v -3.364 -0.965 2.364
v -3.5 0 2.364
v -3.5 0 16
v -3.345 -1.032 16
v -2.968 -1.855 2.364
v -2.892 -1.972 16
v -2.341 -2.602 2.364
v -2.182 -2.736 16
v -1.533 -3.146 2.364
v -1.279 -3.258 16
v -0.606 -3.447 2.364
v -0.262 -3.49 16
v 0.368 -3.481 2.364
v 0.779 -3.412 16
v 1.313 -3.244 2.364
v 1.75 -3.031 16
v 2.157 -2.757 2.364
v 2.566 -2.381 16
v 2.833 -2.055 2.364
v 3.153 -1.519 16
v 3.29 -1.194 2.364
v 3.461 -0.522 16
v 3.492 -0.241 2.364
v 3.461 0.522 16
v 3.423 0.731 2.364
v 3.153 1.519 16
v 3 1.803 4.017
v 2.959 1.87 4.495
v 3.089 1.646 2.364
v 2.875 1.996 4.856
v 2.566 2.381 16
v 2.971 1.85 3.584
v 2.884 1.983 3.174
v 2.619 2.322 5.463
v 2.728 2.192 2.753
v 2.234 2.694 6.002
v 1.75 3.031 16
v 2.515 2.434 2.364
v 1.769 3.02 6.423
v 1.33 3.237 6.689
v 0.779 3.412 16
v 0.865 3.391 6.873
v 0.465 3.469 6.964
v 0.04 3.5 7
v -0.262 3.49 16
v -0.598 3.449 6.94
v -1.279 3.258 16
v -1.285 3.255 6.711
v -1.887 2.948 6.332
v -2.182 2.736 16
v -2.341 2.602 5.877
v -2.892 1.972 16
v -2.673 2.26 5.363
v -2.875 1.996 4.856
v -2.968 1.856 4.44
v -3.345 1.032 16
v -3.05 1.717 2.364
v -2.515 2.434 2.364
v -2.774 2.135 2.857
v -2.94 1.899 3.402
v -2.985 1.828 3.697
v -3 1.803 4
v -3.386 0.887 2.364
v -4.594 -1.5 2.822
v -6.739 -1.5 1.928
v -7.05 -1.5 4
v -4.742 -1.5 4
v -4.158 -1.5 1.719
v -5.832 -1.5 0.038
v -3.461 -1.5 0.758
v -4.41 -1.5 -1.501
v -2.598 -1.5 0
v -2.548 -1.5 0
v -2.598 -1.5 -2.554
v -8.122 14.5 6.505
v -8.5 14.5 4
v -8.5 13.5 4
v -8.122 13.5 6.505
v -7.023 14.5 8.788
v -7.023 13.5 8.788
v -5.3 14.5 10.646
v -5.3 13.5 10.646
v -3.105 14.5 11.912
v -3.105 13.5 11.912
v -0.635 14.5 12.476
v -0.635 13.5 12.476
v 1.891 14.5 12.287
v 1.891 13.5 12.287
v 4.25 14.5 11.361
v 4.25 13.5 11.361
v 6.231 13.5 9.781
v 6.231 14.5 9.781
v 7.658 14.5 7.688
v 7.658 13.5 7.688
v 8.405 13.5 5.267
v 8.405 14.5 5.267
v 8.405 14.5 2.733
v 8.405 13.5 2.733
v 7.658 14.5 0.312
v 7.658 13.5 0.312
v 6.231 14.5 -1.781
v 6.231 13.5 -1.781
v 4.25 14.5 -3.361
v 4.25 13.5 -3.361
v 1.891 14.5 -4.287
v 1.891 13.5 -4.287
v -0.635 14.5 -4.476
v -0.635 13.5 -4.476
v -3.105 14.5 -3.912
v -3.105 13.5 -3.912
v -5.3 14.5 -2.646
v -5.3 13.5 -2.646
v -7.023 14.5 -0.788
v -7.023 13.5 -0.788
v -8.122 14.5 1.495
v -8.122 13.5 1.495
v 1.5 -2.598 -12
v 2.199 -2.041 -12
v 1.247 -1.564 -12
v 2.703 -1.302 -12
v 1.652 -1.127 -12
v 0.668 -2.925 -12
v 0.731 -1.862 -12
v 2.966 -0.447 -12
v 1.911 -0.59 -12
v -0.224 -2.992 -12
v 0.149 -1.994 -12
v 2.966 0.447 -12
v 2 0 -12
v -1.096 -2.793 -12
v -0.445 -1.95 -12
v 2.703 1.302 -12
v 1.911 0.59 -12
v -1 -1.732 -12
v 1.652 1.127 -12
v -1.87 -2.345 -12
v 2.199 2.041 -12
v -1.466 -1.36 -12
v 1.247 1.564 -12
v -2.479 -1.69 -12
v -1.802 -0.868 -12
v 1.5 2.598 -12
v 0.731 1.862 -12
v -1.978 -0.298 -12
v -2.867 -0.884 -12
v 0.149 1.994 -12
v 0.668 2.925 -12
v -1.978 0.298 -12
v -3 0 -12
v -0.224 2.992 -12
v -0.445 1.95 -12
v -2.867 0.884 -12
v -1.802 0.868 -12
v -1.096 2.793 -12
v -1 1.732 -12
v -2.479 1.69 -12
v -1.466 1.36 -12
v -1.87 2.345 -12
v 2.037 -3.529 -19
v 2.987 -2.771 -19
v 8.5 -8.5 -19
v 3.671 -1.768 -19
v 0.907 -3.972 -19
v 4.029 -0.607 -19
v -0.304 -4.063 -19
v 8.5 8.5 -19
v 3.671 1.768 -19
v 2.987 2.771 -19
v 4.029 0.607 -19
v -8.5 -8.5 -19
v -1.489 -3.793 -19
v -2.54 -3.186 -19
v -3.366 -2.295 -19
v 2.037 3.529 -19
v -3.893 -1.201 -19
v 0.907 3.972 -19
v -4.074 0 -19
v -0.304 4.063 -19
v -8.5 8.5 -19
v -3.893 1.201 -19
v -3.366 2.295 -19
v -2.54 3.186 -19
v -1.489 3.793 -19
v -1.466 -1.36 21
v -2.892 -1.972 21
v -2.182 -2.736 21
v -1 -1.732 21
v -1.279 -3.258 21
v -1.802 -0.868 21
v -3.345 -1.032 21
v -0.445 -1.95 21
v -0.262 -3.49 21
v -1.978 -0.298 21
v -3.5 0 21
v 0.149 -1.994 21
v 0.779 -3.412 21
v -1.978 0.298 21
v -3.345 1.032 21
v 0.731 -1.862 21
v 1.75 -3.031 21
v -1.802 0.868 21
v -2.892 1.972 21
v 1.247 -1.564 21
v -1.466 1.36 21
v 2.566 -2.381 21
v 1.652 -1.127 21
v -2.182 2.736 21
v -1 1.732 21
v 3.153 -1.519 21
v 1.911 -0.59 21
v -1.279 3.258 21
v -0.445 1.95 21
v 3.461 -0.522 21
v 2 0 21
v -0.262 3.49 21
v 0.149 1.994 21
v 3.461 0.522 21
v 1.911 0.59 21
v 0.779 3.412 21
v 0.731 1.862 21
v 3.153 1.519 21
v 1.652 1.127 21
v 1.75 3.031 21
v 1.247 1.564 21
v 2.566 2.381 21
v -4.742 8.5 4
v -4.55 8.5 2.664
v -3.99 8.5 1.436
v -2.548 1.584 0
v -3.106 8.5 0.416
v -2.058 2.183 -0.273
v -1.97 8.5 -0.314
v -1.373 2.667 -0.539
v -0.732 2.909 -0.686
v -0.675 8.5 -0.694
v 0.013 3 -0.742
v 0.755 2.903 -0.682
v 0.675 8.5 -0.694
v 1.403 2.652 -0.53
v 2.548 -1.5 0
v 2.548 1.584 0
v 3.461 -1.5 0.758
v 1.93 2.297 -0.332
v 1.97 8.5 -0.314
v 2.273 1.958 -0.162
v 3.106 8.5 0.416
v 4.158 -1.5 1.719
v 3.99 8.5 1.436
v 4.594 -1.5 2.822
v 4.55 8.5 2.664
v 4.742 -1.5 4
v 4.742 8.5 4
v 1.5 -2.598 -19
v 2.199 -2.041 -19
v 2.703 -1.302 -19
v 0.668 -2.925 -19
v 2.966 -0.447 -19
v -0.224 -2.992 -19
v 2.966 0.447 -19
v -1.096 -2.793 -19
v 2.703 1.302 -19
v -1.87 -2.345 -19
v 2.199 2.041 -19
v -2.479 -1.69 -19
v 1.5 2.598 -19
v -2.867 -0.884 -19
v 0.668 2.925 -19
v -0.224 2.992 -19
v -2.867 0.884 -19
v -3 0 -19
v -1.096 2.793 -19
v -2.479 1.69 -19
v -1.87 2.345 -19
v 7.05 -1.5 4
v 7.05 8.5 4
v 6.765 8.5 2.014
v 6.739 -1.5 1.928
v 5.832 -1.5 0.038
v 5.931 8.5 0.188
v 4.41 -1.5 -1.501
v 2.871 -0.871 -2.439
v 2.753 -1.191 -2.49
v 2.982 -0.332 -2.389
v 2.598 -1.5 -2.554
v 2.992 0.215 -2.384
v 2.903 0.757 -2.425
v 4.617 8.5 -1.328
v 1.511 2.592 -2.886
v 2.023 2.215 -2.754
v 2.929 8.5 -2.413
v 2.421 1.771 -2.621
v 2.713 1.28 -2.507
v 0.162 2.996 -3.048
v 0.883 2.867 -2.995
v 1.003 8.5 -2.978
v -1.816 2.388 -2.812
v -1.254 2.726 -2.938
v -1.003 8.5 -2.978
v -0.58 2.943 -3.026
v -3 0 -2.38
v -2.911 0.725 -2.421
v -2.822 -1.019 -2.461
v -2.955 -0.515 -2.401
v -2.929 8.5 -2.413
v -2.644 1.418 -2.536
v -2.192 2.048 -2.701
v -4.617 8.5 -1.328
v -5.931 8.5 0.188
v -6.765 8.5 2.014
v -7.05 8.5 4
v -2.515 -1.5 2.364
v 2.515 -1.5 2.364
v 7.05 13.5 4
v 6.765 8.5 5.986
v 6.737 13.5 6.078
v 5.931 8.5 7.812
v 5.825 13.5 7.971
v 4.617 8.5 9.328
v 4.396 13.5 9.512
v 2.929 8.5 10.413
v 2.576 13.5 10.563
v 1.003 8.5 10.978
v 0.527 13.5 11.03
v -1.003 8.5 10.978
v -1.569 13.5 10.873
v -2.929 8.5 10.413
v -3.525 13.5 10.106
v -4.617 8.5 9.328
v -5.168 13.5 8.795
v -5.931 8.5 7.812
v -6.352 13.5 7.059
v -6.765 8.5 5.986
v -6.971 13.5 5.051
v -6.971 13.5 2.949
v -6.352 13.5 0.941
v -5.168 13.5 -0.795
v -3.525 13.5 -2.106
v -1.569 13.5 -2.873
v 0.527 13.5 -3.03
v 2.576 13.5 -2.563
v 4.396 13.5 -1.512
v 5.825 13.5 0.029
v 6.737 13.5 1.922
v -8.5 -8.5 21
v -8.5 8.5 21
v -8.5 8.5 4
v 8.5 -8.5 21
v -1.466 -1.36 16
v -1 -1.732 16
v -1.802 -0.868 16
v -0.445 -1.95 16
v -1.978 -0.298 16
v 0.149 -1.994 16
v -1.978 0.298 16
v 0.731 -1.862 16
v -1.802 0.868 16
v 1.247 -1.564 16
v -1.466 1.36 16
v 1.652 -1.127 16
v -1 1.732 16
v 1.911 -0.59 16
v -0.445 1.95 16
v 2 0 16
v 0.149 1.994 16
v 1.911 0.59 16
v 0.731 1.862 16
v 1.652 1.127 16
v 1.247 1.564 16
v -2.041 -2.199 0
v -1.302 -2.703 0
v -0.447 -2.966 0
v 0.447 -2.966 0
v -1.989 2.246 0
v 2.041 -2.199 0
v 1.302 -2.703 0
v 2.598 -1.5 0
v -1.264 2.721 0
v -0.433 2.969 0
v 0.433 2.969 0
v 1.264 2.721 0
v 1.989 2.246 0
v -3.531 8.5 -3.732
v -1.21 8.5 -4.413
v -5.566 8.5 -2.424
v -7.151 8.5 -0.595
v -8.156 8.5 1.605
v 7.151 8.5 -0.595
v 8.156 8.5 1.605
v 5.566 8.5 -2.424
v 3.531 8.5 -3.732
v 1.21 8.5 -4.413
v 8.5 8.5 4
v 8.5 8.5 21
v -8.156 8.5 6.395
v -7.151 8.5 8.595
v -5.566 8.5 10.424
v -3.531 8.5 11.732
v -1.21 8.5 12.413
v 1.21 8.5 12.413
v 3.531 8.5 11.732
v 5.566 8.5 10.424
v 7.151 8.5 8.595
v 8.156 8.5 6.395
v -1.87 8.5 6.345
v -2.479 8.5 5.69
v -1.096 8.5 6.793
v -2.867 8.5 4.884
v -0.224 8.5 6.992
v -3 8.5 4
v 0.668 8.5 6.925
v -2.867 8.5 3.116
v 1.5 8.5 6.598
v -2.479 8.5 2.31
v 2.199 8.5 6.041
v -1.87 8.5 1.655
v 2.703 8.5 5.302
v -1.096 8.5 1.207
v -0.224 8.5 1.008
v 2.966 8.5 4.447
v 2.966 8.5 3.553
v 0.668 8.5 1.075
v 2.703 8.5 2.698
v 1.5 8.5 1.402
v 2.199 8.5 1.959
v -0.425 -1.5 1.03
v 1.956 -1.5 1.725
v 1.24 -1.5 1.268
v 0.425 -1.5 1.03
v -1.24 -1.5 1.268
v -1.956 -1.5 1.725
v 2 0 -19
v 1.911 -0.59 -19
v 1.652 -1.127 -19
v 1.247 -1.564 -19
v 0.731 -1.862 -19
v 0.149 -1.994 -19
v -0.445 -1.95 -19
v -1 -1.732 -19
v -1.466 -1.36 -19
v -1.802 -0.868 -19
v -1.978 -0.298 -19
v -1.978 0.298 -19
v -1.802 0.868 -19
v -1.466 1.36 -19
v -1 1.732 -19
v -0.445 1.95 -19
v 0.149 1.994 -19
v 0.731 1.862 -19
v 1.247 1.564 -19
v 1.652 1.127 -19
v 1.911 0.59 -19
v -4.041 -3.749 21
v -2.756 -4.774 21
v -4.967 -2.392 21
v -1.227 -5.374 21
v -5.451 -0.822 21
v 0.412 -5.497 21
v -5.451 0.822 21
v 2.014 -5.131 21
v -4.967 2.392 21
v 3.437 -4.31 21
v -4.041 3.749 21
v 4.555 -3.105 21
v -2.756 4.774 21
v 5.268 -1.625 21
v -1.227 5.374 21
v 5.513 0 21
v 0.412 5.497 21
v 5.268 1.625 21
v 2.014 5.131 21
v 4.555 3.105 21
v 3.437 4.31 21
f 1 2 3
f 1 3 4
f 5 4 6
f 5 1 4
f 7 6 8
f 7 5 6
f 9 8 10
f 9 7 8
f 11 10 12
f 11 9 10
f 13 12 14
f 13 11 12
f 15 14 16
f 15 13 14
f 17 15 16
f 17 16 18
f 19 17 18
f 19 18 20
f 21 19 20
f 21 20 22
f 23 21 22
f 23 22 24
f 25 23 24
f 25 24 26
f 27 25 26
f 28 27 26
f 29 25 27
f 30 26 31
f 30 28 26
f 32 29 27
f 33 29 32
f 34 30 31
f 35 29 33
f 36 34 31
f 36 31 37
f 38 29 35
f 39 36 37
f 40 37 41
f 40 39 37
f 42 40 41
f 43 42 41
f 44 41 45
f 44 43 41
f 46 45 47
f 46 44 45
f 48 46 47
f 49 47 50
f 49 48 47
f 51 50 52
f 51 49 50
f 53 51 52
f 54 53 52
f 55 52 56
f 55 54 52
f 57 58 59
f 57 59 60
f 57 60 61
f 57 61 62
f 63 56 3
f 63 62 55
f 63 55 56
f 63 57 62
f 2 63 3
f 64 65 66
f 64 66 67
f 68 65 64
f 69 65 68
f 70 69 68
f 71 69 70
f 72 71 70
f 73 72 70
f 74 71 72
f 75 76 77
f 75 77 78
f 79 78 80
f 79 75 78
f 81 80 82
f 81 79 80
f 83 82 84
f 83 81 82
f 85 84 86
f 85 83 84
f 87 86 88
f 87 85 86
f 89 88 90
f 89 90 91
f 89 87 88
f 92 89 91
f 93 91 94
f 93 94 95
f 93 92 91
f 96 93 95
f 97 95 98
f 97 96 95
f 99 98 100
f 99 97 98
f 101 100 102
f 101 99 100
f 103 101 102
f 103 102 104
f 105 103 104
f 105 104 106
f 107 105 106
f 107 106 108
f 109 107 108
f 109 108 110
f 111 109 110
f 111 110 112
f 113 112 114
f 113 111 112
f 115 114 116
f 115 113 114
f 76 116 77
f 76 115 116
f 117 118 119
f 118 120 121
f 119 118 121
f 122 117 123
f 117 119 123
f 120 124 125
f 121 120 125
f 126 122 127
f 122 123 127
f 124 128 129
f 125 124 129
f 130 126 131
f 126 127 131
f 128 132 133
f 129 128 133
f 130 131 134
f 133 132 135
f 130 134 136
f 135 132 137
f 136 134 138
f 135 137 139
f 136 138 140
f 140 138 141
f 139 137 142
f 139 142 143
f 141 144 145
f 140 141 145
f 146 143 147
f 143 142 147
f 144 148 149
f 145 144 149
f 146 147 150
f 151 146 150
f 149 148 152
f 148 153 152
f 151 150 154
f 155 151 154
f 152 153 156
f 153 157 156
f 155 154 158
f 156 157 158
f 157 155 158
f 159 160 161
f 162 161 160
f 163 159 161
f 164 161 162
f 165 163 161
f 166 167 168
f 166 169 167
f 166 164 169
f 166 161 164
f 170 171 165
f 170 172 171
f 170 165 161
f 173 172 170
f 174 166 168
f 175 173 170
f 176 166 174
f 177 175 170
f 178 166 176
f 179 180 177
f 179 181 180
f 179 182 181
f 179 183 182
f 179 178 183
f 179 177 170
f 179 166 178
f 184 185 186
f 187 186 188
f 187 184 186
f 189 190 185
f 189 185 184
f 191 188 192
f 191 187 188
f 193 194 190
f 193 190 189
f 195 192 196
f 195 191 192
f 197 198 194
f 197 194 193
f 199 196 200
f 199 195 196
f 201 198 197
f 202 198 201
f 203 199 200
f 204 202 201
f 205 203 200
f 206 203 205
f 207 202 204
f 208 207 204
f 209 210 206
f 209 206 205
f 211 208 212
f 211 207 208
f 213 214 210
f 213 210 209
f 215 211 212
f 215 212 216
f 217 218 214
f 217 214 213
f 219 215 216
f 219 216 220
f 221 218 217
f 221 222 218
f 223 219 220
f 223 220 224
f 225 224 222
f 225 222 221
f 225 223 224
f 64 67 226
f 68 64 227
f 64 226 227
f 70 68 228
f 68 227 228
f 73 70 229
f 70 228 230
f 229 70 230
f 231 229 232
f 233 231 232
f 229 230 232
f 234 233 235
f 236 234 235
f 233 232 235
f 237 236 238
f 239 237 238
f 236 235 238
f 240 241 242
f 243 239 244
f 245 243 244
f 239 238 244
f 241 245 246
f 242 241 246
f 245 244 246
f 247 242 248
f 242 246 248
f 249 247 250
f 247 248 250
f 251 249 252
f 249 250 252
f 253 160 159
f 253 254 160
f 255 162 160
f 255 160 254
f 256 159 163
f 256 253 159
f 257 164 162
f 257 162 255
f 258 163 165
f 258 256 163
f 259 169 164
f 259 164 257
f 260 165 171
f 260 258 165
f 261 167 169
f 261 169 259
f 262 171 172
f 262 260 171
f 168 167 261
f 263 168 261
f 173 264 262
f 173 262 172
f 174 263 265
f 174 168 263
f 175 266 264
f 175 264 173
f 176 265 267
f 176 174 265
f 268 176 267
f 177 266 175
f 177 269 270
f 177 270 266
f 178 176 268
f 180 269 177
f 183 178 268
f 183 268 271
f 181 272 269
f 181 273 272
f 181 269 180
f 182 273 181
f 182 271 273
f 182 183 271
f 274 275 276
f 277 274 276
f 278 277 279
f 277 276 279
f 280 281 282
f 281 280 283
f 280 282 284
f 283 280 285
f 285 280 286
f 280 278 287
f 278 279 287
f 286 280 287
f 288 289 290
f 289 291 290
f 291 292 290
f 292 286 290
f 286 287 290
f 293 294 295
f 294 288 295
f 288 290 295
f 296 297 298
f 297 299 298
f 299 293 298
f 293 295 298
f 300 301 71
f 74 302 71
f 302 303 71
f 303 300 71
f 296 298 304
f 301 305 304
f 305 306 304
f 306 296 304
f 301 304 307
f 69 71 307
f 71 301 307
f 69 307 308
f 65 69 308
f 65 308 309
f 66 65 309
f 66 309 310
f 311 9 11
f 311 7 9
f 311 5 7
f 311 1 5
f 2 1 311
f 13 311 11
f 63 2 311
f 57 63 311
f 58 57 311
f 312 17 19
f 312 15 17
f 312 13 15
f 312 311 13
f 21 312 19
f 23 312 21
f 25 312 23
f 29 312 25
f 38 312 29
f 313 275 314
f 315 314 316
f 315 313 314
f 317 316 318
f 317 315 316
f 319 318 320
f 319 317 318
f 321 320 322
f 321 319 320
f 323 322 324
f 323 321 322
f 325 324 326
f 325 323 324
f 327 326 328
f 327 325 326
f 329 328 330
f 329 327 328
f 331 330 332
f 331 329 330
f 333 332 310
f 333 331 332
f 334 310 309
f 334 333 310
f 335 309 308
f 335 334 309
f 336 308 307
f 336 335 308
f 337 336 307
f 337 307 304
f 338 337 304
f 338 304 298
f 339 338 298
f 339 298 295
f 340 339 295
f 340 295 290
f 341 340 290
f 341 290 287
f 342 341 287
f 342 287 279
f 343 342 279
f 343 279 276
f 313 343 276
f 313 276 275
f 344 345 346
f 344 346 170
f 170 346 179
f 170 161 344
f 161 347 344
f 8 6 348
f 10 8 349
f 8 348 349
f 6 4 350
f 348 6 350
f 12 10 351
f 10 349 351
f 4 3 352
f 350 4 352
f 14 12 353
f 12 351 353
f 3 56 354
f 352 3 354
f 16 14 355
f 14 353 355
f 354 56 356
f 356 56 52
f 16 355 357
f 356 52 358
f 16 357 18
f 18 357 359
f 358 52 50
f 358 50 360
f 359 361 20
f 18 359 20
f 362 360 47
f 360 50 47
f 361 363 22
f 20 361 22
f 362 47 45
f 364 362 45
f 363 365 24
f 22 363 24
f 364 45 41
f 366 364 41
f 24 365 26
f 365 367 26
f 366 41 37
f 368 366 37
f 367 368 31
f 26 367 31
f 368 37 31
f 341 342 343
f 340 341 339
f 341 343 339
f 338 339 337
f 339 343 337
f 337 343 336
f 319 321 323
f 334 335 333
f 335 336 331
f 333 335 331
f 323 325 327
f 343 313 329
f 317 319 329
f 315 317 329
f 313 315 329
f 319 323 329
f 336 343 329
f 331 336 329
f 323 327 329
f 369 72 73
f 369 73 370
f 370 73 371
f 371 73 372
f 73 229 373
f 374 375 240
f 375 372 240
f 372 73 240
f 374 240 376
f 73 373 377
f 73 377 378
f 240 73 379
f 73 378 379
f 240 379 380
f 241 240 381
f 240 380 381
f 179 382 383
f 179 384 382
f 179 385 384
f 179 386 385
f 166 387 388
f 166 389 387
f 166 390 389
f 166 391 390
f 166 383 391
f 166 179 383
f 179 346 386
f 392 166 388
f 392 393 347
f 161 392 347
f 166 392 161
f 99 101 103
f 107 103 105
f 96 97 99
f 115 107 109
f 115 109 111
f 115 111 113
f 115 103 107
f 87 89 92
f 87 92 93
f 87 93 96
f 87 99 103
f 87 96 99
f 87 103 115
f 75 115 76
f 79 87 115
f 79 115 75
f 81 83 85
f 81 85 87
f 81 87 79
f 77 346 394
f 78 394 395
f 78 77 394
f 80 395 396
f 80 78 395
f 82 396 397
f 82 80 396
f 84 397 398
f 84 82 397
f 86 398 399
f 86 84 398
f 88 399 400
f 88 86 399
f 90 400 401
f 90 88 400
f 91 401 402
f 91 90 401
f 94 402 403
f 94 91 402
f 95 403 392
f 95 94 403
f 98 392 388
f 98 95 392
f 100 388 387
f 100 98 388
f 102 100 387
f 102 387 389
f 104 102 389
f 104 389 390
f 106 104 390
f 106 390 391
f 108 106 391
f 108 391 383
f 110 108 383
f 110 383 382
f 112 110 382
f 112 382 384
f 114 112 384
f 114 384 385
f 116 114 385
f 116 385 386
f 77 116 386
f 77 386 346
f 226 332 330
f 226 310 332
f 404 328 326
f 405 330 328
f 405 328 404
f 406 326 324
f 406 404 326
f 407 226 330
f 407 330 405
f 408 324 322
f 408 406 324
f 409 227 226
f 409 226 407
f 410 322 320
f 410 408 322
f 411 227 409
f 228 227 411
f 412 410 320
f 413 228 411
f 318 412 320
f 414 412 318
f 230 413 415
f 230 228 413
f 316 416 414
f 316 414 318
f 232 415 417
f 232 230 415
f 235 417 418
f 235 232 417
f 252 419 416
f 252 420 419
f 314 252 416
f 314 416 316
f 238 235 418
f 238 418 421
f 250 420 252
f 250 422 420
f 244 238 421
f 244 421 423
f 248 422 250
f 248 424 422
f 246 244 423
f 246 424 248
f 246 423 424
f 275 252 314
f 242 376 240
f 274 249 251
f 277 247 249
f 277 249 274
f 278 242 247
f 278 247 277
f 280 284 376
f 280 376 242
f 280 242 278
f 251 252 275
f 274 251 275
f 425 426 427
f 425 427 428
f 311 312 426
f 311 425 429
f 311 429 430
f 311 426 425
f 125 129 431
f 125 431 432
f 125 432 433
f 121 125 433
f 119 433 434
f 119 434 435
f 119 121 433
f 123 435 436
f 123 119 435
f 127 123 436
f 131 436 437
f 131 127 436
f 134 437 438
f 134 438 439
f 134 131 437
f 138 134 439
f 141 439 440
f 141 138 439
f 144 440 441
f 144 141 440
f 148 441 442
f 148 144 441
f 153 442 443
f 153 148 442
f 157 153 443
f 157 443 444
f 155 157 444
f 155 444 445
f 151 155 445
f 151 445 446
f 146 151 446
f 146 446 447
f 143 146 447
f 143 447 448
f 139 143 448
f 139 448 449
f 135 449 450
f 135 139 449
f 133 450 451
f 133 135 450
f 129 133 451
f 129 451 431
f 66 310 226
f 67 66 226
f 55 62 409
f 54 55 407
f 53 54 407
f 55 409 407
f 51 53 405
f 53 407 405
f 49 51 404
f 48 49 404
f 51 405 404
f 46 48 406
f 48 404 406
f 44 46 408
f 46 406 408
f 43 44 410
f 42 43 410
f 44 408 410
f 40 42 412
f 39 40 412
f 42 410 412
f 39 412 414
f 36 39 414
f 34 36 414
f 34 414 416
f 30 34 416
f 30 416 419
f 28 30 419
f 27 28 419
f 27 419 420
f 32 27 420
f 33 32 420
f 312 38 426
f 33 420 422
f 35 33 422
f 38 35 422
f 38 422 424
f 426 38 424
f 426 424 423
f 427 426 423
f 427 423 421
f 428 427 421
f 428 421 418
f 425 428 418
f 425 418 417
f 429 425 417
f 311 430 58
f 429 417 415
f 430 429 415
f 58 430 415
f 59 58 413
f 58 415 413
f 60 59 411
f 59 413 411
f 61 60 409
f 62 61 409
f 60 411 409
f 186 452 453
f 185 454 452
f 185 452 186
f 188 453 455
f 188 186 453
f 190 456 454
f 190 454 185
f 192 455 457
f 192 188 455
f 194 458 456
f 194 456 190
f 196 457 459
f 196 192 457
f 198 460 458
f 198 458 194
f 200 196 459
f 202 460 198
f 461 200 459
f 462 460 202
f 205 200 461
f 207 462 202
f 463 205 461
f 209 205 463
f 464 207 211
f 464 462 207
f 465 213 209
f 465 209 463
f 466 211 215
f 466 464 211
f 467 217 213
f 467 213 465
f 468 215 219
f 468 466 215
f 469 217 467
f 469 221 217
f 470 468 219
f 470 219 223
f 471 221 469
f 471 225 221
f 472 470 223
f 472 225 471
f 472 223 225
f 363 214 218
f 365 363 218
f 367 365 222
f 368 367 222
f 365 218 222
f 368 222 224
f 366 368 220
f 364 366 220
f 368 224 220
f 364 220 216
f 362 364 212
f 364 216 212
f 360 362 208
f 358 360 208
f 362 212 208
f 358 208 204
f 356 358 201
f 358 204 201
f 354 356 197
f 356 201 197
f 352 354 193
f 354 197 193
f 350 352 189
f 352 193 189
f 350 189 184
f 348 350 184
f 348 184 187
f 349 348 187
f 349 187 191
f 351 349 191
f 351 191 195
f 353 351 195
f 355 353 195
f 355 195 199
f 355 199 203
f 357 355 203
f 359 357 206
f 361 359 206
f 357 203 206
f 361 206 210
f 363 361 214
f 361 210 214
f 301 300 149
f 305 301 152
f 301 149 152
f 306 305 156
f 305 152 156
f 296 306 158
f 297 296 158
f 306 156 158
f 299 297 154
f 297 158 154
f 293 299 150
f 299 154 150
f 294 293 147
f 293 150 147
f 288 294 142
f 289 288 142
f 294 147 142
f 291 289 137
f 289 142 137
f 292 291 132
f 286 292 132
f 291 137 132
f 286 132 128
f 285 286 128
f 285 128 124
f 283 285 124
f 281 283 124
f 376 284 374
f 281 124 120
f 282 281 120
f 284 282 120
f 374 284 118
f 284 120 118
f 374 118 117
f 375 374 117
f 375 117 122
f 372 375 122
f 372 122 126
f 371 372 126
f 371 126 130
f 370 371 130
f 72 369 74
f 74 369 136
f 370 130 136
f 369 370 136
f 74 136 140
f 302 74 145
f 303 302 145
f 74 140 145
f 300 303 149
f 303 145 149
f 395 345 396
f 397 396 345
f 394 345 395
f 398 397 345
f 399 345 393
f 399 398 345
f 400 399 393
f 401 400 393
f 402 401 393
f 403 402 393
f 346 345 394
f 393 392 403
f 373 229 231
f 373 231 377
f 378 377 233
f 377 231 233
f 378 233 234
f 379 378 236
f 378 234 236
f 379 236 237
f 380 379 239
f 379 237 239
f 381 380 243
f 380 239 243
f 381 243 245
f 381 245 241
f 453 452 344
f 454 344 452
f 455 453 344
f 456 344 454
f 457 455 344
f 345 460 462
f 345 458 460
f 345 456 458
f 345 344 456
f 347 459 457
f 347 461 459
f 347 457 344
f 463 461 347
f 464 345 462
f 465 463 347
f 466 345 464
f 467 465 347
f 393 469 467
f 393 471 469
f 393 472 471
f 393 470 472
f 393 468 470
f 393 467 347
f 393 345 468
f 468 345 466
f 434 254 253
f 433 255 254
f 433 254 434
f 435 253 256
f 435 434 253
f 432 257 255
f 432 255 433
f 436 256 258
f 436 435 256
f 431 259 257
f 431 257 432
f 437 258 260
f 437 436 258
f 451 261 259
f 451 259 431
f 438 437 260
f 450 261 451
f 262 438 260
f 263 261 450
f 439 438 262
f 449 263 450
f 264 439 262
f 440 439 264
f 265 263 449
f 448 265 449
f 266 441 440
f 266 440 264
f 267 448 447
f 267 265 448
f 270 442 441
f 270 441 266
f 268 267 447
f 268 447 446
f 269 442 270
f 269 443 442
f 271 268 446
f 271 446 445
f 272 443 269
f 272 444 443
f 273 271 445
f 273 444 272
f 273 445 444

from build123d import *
from build123d.topology import SkipClean

# Parameters (mm, degrees)
SKETCH_1_W          = 17
SKETCH_1_H          = 17
SKETCH_1_R          = 3.5
EXTRUDE_1_DEPTH     = 21
SKETCH_4_W          = 17
SKETCH_4_H          = 17
EXTRUDE_2_DEPTH     = 19
SKETCH_5_R          = 3
CUT_EXTRUDE_2_DEPTH = 21
SKETCH_7_W          = 17
SKETCH_7_H          = 2.364359037
EXTRUDE_3_DEPTH     = 15
CUT_EXTRUDE_5_DEPTH = 10
SKETCH_9_R          = 3
CUT_EXTRUDE_6_DEPTH = 10
EXTRUDE_START       = 5
SKETCH_12_R         = 8.5
EXTRUDE_4_DEPTH     = 5
EXTRUDE_START_2     = 1
SKETCH_13_R         = 8.5
EXTRUDE_5_DEPTH     = 1
SKETCH_15_R         = 5.512560125
SKETCH_15_R_2       = 2
EXTRUDE_6_DEPTH     = 5
EXTRUDE_START_3     = -7
SKETCH_16_R         = 4.074487064
SKETCH_16_R_2       = 2
EXTRUDE_7_DEPTH     = 7


with BuildPart() as part:
    # Эскиз1 → Бобышка-Вытянуть1 (new body)
    with BuildSketch(Plane.XY):
        Rectangle(SKETCH_1_W, SKETCH_1_H)
        with Locations(Location((0, 0, 0), (0, 0, 180))):
            Circle(SKETCH_1_R, mode=Mode.SUBTRACT)
    extrude(amount=EXTRUDE_1_DEPTH)

    # Эскиз4 → Бобышка-Вытянуть2 (add)
    with BuildSketch(Plane(origin=(0, 0, 0), x_dir=(-1, 0, 0), z_dir=(0, 0, -1))):
        Rectangle(SKETCH_4_W, SKETCH_4_H)
    extrude(amount=EXTRUDE_2_DEPTH)

    # Эскиз5 → Вырез-Вытянуть2 (cut)
    with BuildSketch(Plane(origin=(0, 0, -19), x_dir=(-1, 0, 0), z_dir=(0, 0, -1))):
        Circle(SKETCH_5_R)
    extrude(amount=-CUT_EXTRUDE_2_DEPTH, mode=Mode.SUBTRACT)

    # Эскиз7 → Бобышка-Вытянуть3 (add)
    with BuildSketch(Plane(origin=(0, 8.5, 0), x_dir=(1, 0, 0), z_dir=(0, 1, 0))):
        with Locations((0, -1.182179519)):
            Rectangle(SKETCH_7_W, SKETCH_7_H)
    extrude(amount=-EXTRUDE_3_DEPTH)

    # Эскиз10 → Вырез-Вытянуть5 (cut)
    with BuildSketch(Plane(origin=(0, 8.5, 0), x_dir=(1, 0, 0), z_dir=(0, 1, 0))):
        with BuildLine():
            Line((-7.050086148, -4), (-4.742367561, -4))
            ThreePointArc((-4.742367561, -4), (0, 0.742367561), (4.742367561, -4))
            Line((4.742367561, -4), (7.050086148, -4))
            ThreePointArc((7.050086148, -4), (0, 3.050086148), (-7.050086148, -4))
        make_face()
    extrude(amount=-CUT_EXTRUDE_5_DEPTH, mode=Mode.SUBTRACT)

    # Эскиз9 → Вырез-Вытянуть6 (cut)
    with BuildSketch(Plane(origin=(0, 8.5, 0), x_dir=(1, 0, 0), z_dir=(0, 1, 0))):
        with Locations(Location((0, -4, 0), (0, 0, 180))):
            Circle(SKETCH_9_R)
    extrude(amount=-CUT_EXTRUDE_6_DEPTH, mode=Mode.SUBTRACT)

    # Эскиз12 → Бобышка-Вытянуть4 (add)
    with SkipClean():  # the faces are left unmerged after this step: merging them gives an invalid solid
        with BuildSketch(Plane(origin=(0, 8.5, 0), x_dir=(1, 0, 0), z_dir=(0, 1, 0)).offset(EXTRUDE_START)):
            with Locations(Location((0, -4, 0), (0, 0, 180))):
                Circle(SKETCH_12_R)
            with BuildLine():
                ThreePointArc((-7.050086148, -4), (0, 3.050086148), (7.050086148, -4))
                ThreePointArc((7.050086148, -4), (0, -11.050086148), (-7.050086148, -4))
            make_face(mode=Mode.SUBTRACT)
        extrude(amount=-EXTRUDE_4_DEPTH)

    # Эскиз13 → Бобышка-Вытянуть5 (add)
    with SkipClean():  # the faces are left unmerged after this step: merging them gives an invalid solid
        with BuildSketch(Plane(origin=(0, 13.5, 0), x_dir=(1, 0, 0), z_dir=(0, 1, 0)).offset(EXTRUDE_START_2)):
            with Locations(Location((0, -4, 0), (0, 0, 180))):
                Circle(SKETCH_13_R)
        extrude(amount=-EXTRUDE_5_DEPTH)

    # Эскиз15 → Бобышка-Вытянуть6 (add)
    with SkipClean():  # the faces are left unmerged after this step: merging them gives an invalid solid
        with BuildSketch(Plane.XY.offset(21)):
            Circle(SKETCH_15_R)
            Circle(SKETCH_15_R_2, mode=Mode.SUBTRACT)
        extrude(amount=-EXTRUDE_6_DEPTH)

    # Эскиз16 → Бобышка-Вытянуть7 (add)
    with SkipClean():  # the faces are left unmerged after this step: merging them gives an invalid solid
        with BuildSketch(Plane(origin=(0, 0, -19), x_dir=(-1, 0, 0), z_dir=(0, 0, -1)).offset(EXTRUDE_START_3)):
            Circle(SKETCH_16_R)
            with Locations(Location((0, 0, 0), (0, 0, 180))):
                Circle(SKETCH_16_R_2, mode=Mode.SUBTRACT)
        extrude(amount=EXTRUDE_7_DEPTH)


solid = part.part
